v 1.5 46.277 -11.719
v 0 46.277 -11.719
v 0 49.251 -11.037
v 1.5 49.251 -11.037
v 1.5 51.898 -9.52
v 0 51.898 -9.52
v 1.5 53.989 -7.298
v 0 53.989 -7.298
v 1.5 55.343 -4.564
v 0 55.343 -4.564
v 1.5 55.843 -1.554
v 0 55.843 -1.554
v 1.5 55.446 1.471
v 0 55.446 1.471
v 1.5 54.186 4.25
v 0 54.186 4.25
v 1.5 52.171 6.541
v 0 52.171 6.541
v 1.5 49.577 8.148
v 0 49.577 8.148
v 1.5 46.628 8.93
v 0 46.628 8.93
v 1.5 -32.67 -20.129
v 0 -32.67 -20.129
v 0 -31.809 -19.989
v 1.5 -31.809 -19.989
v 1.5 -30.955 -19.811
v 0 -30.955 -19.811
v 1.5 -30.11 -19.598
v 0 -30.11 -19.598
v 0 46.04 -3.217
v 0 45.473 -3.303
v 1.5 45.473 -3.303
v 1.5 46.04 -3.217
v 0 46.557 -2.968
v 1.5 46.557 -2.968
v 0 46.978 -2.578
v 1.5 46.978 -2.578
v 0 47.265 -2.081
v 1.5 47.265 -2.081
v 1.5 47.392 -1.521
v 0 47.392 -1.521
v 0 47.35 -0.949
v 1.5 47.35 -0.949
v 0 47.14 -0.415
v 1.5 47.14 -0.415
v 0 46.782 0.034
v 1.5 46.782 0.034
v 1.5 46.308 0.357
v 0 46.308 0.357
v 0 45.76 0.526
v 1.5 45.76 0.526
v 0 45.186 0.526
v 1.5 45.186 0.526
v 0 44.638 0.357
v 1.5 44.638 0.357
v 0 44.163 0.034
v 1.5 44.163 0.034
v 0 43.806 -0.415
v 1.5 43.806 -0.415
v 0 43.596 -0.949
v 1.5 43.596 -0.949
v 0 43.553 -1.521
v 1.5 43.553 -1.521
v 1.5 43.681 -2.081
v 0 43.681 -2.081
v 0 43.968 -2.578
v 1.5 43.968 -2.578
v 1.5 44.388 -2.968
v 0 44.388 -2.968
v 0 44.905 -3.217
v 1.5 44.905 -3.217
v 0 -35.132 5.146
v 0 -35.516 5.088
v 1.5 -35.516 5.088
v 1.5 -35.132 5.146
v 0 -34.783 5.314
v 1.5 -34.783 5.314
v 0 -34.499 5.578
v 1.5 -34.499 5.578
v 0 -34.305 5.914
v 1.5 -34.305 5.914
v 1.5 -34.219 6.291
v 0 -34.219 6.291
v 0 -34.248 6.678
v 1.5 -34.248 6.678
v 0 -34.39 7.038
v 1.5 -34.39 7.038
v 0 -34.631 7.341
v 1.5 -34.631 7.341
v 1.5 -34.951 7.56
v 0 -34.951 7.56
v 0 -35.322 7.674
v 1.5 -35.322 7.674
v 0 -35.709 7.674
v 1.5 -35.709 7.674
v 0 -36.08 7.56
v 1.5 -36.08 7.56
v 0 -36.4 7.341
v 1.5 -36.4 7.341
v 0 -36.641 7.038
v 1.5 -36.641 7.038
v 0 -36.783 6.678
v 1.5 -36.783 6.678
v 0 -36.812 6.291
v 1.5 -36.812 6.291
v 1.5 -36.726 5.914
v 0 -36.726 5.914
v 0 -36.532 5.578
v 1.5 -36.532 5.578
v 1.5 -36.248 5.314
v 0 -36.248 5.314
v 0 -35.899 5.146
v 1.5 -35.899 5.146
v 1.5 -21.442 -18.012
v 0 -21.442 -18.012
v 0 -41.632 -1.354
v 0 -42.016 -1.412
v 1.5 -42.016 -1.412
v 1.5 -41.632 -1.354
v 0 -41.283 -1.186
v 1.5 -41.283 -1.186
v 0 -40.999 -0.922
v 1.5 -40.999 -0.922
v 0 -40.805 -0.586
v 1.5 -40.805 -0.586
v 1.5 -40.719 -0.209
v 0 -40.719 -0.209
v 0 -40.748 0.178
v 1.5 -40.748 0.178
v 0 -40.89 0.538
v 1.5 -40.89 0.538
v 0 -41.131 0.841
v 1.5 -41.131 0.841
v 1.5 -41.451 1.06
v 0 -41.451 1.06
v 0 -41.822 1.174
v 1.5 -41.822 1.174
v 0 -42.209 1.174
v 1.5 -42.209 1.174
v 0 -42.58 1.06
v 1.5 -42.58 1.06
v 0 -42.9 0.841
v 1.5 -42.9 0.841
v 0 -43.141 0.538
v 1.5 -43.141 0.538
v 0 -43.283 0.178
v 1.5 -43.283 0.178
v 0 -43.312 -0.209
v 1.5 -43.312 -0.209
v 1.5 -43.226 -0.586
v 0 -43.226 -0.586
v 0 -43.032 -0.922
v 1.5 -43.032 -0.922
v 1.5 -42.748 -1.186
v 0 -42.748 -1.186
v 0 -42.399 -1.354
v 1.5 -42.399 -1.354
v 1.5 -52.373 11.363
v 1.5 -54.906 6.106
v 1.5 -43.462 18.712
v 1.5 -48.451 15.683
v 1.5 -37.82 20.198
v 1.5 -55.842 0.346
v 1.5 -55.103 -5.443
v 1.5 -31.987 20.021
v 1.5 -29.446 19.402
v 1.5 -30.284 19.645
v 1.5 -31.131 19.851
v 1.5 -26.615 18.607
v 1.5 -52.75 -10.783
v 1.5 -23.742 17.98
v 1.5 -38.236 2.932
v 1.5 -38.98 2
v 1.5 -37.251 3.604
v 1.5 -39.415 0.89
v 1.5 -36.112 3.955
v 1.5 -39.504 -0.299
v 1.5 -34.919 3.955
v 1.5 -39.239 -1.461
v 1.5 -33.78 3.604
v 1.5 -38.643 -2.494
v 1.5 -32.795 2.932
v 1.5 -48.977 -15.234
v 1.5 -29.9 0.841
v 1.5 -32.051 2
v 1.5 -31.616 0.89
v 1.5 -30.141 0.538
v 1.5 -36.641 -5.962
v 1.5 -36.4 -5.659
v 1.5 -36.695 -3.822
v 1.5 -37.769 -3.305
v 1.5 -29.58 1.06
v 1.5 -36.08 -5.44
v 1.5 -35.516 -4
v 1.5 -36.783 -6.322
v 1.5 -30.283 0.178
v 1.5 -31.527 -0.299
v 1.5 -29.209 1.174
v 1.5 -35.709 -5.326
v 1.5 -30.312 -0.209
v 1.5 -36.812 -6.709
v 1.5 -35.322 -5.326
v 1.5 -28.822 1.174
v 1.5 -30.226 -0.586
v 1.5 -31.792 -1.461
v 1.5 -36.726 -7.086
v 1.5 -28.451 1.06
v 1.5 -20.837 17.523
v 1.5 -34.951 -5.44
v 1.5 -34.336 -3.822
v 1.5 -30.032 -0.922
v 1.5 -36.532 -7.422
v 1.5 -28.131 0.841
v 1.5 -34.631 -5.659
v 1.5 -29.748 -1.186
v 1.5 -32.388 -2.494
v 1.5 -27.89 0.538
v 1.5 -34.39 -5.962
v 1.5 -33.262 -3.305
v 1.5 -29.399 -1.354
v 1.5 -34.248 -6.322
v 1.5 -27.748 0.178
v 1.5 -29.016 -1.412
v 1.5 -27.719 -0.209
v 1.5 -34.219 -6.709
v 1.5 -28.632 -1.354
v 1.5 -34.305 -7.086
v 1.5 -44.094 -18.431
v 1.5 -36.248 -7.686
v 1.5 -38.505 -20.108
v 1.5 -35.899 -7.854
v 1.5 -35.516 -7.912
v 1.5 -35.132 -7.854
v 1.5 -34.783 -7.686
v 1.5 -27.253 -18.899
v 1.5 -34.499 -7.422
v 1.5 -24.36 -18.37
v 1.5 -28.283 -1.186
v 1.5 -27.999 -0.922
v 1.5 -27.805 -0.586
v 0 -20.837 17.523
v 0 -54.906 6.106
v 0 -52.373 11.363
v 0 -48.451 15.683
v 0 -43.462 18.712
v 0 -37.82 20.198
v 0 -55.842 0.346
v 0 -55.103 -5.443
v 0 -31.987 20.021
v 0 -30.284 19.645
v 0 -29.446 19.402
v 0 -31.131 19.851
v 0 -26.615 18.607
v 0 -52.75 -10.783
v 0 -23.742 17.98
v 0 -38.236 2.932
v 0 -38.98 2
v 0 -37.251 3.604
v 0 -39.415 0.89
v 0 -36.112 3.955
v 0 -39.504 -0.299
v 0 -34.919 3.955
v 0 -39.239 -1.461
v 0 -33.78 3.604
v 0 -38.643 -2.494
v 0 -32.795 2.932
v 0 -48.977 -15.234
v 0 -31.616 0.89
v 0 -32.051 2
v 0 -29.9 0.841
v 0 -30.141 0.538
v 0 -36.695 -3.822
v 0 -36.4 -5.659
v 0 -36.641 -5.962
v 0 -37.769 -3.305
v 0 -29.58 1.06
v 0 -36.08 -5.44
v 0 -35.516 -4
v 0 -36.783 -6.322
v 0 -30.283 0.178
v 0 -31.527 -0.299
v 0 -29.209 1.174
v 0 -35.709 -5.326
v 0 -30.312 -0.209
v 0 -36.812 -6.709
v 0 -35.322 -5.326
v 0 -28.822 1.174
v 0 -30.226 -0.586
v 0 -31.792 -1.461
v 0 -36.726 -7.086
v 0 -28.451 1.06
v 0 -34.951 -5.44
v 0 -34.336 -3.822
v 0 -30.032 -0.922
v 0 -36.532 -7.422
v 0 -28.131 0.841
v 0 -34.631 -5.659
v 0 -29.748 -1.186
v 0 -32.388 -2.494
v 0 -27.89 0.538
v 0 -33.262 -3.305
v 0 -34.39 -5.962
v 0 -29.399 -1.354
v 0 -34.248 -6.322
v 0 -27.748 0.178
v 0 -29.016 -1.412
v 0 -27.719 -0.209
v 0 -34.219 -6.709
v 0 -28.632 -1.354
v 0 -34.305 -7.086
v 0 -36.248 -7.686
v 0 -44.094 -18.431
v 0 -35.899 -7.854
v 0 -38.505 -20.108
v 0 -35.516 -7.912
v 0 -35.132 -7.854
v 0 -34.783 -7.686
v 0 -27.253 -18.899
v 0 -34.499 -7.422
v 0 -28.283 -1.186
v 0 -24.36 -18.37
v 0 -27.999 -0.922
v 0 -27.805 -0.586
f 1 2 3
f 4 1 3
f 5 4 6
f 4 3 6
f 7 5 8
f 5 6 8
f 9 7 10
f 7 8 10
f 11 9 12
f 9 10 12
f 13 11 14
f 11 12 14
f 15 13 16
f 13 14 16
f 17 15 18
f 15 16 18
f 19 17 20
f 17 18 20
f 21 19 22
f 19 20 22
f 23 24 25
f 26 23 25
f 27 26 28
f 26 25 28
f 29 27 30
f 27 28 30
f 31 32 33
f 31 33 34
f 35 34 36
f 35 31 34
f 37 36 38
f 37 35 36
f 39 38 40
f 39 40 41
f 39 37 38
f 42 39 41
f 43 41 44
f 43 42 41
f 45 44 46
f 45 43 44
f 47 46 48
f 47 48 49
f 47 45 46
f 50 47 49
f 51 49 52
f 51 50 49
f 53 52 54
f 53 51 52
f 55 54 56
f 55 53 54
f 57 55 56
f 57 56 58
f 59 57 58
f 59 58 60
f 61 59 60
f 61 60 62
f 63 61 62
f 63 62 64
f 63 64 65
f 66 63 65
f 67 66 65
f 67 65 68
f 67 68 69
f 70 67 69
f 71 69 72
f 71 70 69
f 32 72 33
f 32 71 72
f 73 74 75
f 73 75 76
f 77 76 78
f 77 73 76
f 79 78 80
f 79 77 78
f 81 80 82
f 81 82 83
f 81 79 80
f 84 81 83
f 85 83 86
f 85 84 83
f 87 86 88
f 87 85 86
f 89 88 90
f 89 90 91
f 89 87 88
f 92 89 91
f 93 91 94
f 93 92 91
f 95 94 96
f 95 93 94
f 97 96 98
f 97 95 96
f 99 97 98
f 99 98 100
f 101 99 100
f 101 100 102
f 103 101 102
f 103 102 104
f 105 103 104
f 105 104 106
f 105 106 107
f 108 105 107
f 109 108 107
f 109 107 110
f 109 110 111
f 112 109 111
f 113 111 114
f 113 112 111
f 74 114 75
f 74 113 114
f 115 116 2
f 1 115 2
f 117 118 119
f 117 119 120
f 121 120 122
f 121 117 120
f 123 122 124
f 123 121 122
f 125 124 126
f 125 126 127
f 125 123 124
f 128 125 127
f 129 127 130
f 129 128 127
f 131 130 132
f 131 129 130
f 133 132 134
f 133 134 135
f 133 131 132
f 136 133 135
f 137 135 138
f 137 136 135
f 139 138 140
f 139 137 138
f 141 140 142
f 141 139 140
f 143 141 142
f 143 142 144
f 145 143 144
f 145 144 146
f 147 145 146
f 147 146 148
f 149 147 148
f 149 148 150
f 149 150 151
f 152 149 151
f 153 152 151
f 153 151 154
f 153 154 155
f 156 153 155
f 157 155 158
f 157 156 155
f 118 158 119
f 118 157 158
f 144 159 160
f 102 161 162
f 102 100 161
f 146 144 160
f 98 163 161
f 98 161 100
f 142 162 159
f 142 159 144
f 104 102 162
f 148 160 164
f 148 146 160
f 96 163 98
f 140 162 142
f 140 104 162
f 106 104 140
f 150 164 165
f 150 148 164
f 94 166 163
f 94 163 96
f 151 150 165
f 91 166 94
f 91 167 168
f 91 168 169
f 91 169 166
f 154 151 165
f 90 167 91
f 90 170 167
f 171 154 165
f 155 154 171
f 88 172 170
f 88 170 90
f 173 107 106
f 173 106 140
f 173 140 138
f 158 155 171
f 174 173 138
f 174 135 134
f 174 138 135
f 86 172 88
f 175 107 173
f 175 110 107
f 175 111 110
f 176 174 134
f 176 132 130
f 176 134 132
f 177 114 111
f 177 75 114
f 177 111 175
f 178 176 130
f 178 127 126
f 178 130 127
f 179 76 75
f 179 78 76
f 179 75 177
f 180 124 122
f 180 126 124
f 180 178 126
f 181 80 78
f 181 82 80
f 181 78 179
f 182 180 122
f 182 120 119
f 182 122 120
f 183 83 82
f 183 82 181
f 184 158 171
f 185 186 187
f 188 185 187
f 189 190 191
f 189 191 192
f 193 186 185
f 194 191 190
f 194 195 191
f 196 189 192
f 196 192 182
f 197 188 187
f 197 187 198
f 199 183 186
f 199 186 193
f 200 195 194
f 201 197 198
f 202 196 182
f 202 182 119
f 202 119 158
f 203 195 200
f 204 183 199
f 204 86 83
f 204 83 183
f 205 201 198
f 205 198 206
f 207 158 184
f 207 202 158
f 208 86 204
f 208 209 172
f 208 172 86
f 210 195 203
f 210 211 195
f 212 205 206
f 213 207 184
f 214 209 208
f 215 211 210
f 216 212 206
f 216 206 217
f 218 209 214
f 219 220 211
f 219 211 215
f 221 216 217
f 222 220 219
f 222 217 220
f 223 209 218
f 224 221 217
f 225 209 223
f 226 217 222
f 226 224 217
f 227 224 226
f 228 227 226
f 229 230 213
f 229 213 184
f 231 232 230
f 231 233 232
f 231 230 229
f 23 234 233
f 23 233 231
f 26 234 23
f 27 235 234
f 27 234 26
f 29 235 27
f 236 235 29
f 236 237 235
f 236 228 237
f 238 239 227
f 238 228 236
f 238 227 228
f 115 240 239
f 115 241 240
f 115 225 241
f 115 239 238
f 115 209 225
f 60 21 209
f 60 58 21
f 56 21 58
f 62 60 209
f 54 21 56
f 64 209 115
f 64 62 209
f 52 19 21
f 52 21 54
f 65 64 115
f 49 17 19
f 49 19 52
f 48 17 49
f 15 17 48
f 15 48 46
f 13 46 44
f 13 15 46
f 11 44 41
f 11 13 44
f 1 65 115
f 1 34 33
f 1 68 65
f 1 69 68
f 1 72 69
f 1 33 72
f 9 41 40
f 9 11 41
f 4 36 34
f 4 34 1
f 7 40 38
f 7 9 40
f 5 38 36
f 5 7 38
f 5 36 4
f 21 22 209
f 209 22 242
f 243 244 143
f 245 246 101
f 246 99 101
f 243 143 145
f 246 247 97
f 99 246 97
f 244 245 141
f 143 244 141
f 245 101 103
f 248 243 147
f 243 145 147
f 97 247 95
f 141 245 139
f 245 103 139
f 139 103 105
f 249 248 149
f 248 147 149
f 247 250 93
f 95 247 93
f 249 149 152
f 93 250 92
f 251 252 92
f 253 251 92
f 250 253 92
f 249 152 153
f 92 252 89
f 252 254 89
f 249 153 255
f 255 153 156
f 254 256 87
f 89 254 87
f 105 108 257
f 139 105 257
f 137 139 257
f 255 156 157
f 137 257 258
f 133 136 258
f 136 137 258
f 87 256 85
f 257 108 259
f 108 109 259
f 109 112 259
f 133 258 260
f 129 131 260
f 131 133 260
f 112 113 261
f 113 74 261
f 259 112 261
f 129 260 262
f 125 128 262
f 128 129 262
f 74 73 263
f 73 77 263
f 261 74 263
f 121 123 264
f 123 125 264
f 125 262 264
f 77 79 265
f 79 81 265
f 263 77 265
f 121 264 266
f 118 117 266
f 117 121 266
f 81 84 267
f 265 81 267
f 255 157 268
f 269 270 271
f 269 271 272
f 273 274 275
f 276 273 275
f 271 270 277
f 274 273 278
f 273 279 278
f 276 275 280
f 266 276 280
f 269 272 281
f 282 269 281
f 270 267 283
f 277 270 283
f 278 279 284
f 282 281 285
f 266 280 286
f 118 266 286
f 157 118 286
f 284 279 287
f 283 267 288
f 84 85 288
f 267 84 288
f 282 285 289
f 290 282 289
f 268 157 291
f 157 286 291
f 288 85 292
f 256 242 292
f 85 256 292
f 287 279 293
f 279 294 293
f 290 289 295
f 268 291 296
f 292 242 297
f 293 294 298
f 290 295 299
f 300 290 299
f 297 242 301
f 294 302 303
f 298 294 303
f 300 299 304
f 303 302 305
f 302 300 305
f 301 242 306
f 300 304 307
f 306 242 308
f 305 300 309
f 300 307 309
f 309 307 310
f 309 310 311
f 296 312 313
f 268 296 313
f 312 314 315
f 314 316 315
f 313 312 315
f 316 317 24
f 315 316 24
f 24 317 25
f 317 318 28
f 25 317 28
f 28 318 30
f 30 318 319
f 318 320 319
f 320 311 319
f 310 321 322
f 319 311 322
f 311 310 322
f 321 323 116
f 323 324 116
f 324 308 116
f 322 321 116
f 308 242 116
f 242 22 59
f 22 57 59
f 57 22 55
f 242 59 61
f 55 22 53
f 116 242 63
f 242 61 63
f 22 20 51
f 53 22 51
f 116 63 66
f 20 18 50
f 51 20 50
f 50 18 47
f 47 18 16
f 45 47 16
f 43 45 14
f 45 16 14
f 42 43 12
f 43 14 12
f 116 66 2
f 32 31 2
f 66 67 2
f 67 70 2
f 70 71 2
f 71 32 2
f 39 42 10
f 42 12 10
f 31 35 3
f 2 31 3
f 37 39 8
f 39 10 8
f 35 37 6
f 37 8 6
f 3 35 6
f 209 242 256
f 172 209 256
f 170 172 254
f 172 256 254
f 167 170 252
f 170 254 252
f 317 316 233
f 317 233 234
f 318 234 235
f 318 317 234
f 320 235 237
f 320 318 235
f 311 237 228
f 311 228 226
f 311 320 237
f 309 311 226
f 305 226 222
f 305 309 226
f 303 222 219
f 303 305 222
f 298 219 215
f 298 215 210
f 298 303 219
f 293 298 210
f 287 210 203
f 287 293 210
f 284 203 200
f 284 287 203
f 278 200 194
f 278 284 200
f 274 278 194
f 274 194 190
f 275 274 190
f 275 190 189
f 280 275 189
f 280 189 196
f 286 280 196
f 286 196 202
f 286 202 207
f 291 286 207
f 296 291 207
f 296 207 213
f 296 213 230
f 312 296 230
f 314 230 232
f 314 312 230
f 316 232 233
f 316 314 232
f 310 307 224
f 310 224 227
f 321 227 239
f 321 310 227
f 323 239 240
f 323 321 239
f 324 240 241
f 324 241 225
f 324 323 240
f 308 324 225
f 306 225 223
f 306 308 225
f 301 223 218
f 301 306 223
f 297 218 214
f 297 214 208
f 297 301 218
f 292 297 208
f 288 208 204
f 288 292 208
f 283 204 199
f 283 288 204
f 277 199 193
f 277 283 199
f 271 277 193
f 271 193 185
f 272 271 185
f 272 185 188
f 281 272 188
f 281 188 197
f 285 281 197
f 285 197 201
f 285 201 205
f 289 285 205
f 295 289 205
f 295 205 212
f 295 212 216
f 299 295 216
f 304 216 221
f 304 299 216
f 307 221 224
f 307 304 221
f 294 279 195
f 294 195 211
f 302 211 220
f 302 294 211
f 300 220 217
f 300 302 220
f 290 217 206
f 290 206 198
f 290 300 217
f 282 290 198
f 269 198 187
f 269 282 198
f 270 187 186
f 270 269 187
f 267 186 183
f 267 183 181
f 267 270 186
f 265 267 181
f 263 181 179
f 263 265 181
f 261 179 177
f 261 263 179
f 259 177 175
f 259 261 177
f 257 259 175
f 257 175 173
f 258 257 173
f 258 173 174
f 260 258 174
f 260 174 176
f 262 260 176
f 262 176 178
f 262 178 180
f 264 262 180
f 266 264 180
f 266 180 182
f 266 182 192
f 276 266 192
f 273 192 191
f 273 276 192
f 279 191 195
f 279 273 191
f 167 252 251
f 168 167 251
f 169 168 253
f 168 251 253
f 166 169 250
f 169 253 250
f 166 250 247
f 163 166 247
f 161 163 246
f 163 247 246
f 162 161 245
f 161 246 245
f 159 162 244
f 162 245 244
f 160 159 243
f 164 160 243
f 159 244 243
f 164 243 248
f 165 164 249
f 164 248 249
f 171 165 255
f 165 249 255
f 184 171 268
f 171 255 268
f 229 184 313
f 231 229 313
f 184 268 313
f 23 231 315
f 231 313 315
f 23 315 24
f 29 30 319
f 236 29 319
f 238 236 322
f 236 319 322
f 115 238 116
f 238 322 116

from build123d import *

# Parameters (mm, degrees)
SKETCH_2_R      = 1.3
SKETCH_2_R_2    = 4
SKETCH_2_R_3    = 1.925
EXTRUDE_1_DEPTH = 1.5


with BuildPart() as part:
    # 草圖2 → 填料-伸長1 (new body)
    with BuildSketch(Plane(origin=(0, 0, 0), x_dir=(0, 0, -1), z_dir=(1, 0, 0))):
        with BuildLine():
            Line((18.012072511, -21.441606673), (11.718522882, 46.276737912))
            ThreePointArc((11.718522882, 46.276737912), (1.55399875, 55.843411078), (-8.930005845, 46.627965677))
            Line((-8.930005845, 46.627965677), (-17.523002046, -20.837161438))
            ThreePointArc((-17.523002046, -20.837161438), (-18.27264724, -25.183298229), (-19.402359762, -29.446468708))
            ThreePointArc((-19.402359762, -29.446468708), (-19.752456192, -30.70663404), (-20.020797275, -31.986703271))
            ThreePointArc((-20.020797275, -31.986703271), (-0.345749536, -55.841970902), (20.12922907, -32.669648007))
            ThreePointArc((20.12922907, -32.669648007), (19.904578122, -31.38119307), (19.597542195, -30.109850035))
            ThreePointArc((19.597542195, -30.109850035), (18.61347279, -25.810724505), (18.012072511, -21.441606673))
        make_face()
        with Locations((-6.388480657, -35.515504866)):
            Circle(SKETCH_2_R, mode=Mode.SUBTRACT)
        with Locations((0.111519343, -42.015504866)):
            Circle(SKETCH_2_R, mode=Mode.SUBTRACT)
        with Locations((0, -35.515504866)):
            Circle(SKETCH_2_R_2, mode=Mode.SUBTRACT)
        with Locations((0.111519343, -29.015504866)):
            Circle(SKETCH_2_R, mode=Mode.SUBTRACT)
        with Locations((6.611519343, -35.515504866)):
            Circle(SKETCH_2_R, mode=Mode.SUBTRACT)
        with Locations((1.377596172, 45.472779649)):
            Circle(SKETCH_2_R_3, mode=Mode.SUBTRACT)
    extrude(amount=EXTRUDE_1_DEPTH)


solid = part.part
